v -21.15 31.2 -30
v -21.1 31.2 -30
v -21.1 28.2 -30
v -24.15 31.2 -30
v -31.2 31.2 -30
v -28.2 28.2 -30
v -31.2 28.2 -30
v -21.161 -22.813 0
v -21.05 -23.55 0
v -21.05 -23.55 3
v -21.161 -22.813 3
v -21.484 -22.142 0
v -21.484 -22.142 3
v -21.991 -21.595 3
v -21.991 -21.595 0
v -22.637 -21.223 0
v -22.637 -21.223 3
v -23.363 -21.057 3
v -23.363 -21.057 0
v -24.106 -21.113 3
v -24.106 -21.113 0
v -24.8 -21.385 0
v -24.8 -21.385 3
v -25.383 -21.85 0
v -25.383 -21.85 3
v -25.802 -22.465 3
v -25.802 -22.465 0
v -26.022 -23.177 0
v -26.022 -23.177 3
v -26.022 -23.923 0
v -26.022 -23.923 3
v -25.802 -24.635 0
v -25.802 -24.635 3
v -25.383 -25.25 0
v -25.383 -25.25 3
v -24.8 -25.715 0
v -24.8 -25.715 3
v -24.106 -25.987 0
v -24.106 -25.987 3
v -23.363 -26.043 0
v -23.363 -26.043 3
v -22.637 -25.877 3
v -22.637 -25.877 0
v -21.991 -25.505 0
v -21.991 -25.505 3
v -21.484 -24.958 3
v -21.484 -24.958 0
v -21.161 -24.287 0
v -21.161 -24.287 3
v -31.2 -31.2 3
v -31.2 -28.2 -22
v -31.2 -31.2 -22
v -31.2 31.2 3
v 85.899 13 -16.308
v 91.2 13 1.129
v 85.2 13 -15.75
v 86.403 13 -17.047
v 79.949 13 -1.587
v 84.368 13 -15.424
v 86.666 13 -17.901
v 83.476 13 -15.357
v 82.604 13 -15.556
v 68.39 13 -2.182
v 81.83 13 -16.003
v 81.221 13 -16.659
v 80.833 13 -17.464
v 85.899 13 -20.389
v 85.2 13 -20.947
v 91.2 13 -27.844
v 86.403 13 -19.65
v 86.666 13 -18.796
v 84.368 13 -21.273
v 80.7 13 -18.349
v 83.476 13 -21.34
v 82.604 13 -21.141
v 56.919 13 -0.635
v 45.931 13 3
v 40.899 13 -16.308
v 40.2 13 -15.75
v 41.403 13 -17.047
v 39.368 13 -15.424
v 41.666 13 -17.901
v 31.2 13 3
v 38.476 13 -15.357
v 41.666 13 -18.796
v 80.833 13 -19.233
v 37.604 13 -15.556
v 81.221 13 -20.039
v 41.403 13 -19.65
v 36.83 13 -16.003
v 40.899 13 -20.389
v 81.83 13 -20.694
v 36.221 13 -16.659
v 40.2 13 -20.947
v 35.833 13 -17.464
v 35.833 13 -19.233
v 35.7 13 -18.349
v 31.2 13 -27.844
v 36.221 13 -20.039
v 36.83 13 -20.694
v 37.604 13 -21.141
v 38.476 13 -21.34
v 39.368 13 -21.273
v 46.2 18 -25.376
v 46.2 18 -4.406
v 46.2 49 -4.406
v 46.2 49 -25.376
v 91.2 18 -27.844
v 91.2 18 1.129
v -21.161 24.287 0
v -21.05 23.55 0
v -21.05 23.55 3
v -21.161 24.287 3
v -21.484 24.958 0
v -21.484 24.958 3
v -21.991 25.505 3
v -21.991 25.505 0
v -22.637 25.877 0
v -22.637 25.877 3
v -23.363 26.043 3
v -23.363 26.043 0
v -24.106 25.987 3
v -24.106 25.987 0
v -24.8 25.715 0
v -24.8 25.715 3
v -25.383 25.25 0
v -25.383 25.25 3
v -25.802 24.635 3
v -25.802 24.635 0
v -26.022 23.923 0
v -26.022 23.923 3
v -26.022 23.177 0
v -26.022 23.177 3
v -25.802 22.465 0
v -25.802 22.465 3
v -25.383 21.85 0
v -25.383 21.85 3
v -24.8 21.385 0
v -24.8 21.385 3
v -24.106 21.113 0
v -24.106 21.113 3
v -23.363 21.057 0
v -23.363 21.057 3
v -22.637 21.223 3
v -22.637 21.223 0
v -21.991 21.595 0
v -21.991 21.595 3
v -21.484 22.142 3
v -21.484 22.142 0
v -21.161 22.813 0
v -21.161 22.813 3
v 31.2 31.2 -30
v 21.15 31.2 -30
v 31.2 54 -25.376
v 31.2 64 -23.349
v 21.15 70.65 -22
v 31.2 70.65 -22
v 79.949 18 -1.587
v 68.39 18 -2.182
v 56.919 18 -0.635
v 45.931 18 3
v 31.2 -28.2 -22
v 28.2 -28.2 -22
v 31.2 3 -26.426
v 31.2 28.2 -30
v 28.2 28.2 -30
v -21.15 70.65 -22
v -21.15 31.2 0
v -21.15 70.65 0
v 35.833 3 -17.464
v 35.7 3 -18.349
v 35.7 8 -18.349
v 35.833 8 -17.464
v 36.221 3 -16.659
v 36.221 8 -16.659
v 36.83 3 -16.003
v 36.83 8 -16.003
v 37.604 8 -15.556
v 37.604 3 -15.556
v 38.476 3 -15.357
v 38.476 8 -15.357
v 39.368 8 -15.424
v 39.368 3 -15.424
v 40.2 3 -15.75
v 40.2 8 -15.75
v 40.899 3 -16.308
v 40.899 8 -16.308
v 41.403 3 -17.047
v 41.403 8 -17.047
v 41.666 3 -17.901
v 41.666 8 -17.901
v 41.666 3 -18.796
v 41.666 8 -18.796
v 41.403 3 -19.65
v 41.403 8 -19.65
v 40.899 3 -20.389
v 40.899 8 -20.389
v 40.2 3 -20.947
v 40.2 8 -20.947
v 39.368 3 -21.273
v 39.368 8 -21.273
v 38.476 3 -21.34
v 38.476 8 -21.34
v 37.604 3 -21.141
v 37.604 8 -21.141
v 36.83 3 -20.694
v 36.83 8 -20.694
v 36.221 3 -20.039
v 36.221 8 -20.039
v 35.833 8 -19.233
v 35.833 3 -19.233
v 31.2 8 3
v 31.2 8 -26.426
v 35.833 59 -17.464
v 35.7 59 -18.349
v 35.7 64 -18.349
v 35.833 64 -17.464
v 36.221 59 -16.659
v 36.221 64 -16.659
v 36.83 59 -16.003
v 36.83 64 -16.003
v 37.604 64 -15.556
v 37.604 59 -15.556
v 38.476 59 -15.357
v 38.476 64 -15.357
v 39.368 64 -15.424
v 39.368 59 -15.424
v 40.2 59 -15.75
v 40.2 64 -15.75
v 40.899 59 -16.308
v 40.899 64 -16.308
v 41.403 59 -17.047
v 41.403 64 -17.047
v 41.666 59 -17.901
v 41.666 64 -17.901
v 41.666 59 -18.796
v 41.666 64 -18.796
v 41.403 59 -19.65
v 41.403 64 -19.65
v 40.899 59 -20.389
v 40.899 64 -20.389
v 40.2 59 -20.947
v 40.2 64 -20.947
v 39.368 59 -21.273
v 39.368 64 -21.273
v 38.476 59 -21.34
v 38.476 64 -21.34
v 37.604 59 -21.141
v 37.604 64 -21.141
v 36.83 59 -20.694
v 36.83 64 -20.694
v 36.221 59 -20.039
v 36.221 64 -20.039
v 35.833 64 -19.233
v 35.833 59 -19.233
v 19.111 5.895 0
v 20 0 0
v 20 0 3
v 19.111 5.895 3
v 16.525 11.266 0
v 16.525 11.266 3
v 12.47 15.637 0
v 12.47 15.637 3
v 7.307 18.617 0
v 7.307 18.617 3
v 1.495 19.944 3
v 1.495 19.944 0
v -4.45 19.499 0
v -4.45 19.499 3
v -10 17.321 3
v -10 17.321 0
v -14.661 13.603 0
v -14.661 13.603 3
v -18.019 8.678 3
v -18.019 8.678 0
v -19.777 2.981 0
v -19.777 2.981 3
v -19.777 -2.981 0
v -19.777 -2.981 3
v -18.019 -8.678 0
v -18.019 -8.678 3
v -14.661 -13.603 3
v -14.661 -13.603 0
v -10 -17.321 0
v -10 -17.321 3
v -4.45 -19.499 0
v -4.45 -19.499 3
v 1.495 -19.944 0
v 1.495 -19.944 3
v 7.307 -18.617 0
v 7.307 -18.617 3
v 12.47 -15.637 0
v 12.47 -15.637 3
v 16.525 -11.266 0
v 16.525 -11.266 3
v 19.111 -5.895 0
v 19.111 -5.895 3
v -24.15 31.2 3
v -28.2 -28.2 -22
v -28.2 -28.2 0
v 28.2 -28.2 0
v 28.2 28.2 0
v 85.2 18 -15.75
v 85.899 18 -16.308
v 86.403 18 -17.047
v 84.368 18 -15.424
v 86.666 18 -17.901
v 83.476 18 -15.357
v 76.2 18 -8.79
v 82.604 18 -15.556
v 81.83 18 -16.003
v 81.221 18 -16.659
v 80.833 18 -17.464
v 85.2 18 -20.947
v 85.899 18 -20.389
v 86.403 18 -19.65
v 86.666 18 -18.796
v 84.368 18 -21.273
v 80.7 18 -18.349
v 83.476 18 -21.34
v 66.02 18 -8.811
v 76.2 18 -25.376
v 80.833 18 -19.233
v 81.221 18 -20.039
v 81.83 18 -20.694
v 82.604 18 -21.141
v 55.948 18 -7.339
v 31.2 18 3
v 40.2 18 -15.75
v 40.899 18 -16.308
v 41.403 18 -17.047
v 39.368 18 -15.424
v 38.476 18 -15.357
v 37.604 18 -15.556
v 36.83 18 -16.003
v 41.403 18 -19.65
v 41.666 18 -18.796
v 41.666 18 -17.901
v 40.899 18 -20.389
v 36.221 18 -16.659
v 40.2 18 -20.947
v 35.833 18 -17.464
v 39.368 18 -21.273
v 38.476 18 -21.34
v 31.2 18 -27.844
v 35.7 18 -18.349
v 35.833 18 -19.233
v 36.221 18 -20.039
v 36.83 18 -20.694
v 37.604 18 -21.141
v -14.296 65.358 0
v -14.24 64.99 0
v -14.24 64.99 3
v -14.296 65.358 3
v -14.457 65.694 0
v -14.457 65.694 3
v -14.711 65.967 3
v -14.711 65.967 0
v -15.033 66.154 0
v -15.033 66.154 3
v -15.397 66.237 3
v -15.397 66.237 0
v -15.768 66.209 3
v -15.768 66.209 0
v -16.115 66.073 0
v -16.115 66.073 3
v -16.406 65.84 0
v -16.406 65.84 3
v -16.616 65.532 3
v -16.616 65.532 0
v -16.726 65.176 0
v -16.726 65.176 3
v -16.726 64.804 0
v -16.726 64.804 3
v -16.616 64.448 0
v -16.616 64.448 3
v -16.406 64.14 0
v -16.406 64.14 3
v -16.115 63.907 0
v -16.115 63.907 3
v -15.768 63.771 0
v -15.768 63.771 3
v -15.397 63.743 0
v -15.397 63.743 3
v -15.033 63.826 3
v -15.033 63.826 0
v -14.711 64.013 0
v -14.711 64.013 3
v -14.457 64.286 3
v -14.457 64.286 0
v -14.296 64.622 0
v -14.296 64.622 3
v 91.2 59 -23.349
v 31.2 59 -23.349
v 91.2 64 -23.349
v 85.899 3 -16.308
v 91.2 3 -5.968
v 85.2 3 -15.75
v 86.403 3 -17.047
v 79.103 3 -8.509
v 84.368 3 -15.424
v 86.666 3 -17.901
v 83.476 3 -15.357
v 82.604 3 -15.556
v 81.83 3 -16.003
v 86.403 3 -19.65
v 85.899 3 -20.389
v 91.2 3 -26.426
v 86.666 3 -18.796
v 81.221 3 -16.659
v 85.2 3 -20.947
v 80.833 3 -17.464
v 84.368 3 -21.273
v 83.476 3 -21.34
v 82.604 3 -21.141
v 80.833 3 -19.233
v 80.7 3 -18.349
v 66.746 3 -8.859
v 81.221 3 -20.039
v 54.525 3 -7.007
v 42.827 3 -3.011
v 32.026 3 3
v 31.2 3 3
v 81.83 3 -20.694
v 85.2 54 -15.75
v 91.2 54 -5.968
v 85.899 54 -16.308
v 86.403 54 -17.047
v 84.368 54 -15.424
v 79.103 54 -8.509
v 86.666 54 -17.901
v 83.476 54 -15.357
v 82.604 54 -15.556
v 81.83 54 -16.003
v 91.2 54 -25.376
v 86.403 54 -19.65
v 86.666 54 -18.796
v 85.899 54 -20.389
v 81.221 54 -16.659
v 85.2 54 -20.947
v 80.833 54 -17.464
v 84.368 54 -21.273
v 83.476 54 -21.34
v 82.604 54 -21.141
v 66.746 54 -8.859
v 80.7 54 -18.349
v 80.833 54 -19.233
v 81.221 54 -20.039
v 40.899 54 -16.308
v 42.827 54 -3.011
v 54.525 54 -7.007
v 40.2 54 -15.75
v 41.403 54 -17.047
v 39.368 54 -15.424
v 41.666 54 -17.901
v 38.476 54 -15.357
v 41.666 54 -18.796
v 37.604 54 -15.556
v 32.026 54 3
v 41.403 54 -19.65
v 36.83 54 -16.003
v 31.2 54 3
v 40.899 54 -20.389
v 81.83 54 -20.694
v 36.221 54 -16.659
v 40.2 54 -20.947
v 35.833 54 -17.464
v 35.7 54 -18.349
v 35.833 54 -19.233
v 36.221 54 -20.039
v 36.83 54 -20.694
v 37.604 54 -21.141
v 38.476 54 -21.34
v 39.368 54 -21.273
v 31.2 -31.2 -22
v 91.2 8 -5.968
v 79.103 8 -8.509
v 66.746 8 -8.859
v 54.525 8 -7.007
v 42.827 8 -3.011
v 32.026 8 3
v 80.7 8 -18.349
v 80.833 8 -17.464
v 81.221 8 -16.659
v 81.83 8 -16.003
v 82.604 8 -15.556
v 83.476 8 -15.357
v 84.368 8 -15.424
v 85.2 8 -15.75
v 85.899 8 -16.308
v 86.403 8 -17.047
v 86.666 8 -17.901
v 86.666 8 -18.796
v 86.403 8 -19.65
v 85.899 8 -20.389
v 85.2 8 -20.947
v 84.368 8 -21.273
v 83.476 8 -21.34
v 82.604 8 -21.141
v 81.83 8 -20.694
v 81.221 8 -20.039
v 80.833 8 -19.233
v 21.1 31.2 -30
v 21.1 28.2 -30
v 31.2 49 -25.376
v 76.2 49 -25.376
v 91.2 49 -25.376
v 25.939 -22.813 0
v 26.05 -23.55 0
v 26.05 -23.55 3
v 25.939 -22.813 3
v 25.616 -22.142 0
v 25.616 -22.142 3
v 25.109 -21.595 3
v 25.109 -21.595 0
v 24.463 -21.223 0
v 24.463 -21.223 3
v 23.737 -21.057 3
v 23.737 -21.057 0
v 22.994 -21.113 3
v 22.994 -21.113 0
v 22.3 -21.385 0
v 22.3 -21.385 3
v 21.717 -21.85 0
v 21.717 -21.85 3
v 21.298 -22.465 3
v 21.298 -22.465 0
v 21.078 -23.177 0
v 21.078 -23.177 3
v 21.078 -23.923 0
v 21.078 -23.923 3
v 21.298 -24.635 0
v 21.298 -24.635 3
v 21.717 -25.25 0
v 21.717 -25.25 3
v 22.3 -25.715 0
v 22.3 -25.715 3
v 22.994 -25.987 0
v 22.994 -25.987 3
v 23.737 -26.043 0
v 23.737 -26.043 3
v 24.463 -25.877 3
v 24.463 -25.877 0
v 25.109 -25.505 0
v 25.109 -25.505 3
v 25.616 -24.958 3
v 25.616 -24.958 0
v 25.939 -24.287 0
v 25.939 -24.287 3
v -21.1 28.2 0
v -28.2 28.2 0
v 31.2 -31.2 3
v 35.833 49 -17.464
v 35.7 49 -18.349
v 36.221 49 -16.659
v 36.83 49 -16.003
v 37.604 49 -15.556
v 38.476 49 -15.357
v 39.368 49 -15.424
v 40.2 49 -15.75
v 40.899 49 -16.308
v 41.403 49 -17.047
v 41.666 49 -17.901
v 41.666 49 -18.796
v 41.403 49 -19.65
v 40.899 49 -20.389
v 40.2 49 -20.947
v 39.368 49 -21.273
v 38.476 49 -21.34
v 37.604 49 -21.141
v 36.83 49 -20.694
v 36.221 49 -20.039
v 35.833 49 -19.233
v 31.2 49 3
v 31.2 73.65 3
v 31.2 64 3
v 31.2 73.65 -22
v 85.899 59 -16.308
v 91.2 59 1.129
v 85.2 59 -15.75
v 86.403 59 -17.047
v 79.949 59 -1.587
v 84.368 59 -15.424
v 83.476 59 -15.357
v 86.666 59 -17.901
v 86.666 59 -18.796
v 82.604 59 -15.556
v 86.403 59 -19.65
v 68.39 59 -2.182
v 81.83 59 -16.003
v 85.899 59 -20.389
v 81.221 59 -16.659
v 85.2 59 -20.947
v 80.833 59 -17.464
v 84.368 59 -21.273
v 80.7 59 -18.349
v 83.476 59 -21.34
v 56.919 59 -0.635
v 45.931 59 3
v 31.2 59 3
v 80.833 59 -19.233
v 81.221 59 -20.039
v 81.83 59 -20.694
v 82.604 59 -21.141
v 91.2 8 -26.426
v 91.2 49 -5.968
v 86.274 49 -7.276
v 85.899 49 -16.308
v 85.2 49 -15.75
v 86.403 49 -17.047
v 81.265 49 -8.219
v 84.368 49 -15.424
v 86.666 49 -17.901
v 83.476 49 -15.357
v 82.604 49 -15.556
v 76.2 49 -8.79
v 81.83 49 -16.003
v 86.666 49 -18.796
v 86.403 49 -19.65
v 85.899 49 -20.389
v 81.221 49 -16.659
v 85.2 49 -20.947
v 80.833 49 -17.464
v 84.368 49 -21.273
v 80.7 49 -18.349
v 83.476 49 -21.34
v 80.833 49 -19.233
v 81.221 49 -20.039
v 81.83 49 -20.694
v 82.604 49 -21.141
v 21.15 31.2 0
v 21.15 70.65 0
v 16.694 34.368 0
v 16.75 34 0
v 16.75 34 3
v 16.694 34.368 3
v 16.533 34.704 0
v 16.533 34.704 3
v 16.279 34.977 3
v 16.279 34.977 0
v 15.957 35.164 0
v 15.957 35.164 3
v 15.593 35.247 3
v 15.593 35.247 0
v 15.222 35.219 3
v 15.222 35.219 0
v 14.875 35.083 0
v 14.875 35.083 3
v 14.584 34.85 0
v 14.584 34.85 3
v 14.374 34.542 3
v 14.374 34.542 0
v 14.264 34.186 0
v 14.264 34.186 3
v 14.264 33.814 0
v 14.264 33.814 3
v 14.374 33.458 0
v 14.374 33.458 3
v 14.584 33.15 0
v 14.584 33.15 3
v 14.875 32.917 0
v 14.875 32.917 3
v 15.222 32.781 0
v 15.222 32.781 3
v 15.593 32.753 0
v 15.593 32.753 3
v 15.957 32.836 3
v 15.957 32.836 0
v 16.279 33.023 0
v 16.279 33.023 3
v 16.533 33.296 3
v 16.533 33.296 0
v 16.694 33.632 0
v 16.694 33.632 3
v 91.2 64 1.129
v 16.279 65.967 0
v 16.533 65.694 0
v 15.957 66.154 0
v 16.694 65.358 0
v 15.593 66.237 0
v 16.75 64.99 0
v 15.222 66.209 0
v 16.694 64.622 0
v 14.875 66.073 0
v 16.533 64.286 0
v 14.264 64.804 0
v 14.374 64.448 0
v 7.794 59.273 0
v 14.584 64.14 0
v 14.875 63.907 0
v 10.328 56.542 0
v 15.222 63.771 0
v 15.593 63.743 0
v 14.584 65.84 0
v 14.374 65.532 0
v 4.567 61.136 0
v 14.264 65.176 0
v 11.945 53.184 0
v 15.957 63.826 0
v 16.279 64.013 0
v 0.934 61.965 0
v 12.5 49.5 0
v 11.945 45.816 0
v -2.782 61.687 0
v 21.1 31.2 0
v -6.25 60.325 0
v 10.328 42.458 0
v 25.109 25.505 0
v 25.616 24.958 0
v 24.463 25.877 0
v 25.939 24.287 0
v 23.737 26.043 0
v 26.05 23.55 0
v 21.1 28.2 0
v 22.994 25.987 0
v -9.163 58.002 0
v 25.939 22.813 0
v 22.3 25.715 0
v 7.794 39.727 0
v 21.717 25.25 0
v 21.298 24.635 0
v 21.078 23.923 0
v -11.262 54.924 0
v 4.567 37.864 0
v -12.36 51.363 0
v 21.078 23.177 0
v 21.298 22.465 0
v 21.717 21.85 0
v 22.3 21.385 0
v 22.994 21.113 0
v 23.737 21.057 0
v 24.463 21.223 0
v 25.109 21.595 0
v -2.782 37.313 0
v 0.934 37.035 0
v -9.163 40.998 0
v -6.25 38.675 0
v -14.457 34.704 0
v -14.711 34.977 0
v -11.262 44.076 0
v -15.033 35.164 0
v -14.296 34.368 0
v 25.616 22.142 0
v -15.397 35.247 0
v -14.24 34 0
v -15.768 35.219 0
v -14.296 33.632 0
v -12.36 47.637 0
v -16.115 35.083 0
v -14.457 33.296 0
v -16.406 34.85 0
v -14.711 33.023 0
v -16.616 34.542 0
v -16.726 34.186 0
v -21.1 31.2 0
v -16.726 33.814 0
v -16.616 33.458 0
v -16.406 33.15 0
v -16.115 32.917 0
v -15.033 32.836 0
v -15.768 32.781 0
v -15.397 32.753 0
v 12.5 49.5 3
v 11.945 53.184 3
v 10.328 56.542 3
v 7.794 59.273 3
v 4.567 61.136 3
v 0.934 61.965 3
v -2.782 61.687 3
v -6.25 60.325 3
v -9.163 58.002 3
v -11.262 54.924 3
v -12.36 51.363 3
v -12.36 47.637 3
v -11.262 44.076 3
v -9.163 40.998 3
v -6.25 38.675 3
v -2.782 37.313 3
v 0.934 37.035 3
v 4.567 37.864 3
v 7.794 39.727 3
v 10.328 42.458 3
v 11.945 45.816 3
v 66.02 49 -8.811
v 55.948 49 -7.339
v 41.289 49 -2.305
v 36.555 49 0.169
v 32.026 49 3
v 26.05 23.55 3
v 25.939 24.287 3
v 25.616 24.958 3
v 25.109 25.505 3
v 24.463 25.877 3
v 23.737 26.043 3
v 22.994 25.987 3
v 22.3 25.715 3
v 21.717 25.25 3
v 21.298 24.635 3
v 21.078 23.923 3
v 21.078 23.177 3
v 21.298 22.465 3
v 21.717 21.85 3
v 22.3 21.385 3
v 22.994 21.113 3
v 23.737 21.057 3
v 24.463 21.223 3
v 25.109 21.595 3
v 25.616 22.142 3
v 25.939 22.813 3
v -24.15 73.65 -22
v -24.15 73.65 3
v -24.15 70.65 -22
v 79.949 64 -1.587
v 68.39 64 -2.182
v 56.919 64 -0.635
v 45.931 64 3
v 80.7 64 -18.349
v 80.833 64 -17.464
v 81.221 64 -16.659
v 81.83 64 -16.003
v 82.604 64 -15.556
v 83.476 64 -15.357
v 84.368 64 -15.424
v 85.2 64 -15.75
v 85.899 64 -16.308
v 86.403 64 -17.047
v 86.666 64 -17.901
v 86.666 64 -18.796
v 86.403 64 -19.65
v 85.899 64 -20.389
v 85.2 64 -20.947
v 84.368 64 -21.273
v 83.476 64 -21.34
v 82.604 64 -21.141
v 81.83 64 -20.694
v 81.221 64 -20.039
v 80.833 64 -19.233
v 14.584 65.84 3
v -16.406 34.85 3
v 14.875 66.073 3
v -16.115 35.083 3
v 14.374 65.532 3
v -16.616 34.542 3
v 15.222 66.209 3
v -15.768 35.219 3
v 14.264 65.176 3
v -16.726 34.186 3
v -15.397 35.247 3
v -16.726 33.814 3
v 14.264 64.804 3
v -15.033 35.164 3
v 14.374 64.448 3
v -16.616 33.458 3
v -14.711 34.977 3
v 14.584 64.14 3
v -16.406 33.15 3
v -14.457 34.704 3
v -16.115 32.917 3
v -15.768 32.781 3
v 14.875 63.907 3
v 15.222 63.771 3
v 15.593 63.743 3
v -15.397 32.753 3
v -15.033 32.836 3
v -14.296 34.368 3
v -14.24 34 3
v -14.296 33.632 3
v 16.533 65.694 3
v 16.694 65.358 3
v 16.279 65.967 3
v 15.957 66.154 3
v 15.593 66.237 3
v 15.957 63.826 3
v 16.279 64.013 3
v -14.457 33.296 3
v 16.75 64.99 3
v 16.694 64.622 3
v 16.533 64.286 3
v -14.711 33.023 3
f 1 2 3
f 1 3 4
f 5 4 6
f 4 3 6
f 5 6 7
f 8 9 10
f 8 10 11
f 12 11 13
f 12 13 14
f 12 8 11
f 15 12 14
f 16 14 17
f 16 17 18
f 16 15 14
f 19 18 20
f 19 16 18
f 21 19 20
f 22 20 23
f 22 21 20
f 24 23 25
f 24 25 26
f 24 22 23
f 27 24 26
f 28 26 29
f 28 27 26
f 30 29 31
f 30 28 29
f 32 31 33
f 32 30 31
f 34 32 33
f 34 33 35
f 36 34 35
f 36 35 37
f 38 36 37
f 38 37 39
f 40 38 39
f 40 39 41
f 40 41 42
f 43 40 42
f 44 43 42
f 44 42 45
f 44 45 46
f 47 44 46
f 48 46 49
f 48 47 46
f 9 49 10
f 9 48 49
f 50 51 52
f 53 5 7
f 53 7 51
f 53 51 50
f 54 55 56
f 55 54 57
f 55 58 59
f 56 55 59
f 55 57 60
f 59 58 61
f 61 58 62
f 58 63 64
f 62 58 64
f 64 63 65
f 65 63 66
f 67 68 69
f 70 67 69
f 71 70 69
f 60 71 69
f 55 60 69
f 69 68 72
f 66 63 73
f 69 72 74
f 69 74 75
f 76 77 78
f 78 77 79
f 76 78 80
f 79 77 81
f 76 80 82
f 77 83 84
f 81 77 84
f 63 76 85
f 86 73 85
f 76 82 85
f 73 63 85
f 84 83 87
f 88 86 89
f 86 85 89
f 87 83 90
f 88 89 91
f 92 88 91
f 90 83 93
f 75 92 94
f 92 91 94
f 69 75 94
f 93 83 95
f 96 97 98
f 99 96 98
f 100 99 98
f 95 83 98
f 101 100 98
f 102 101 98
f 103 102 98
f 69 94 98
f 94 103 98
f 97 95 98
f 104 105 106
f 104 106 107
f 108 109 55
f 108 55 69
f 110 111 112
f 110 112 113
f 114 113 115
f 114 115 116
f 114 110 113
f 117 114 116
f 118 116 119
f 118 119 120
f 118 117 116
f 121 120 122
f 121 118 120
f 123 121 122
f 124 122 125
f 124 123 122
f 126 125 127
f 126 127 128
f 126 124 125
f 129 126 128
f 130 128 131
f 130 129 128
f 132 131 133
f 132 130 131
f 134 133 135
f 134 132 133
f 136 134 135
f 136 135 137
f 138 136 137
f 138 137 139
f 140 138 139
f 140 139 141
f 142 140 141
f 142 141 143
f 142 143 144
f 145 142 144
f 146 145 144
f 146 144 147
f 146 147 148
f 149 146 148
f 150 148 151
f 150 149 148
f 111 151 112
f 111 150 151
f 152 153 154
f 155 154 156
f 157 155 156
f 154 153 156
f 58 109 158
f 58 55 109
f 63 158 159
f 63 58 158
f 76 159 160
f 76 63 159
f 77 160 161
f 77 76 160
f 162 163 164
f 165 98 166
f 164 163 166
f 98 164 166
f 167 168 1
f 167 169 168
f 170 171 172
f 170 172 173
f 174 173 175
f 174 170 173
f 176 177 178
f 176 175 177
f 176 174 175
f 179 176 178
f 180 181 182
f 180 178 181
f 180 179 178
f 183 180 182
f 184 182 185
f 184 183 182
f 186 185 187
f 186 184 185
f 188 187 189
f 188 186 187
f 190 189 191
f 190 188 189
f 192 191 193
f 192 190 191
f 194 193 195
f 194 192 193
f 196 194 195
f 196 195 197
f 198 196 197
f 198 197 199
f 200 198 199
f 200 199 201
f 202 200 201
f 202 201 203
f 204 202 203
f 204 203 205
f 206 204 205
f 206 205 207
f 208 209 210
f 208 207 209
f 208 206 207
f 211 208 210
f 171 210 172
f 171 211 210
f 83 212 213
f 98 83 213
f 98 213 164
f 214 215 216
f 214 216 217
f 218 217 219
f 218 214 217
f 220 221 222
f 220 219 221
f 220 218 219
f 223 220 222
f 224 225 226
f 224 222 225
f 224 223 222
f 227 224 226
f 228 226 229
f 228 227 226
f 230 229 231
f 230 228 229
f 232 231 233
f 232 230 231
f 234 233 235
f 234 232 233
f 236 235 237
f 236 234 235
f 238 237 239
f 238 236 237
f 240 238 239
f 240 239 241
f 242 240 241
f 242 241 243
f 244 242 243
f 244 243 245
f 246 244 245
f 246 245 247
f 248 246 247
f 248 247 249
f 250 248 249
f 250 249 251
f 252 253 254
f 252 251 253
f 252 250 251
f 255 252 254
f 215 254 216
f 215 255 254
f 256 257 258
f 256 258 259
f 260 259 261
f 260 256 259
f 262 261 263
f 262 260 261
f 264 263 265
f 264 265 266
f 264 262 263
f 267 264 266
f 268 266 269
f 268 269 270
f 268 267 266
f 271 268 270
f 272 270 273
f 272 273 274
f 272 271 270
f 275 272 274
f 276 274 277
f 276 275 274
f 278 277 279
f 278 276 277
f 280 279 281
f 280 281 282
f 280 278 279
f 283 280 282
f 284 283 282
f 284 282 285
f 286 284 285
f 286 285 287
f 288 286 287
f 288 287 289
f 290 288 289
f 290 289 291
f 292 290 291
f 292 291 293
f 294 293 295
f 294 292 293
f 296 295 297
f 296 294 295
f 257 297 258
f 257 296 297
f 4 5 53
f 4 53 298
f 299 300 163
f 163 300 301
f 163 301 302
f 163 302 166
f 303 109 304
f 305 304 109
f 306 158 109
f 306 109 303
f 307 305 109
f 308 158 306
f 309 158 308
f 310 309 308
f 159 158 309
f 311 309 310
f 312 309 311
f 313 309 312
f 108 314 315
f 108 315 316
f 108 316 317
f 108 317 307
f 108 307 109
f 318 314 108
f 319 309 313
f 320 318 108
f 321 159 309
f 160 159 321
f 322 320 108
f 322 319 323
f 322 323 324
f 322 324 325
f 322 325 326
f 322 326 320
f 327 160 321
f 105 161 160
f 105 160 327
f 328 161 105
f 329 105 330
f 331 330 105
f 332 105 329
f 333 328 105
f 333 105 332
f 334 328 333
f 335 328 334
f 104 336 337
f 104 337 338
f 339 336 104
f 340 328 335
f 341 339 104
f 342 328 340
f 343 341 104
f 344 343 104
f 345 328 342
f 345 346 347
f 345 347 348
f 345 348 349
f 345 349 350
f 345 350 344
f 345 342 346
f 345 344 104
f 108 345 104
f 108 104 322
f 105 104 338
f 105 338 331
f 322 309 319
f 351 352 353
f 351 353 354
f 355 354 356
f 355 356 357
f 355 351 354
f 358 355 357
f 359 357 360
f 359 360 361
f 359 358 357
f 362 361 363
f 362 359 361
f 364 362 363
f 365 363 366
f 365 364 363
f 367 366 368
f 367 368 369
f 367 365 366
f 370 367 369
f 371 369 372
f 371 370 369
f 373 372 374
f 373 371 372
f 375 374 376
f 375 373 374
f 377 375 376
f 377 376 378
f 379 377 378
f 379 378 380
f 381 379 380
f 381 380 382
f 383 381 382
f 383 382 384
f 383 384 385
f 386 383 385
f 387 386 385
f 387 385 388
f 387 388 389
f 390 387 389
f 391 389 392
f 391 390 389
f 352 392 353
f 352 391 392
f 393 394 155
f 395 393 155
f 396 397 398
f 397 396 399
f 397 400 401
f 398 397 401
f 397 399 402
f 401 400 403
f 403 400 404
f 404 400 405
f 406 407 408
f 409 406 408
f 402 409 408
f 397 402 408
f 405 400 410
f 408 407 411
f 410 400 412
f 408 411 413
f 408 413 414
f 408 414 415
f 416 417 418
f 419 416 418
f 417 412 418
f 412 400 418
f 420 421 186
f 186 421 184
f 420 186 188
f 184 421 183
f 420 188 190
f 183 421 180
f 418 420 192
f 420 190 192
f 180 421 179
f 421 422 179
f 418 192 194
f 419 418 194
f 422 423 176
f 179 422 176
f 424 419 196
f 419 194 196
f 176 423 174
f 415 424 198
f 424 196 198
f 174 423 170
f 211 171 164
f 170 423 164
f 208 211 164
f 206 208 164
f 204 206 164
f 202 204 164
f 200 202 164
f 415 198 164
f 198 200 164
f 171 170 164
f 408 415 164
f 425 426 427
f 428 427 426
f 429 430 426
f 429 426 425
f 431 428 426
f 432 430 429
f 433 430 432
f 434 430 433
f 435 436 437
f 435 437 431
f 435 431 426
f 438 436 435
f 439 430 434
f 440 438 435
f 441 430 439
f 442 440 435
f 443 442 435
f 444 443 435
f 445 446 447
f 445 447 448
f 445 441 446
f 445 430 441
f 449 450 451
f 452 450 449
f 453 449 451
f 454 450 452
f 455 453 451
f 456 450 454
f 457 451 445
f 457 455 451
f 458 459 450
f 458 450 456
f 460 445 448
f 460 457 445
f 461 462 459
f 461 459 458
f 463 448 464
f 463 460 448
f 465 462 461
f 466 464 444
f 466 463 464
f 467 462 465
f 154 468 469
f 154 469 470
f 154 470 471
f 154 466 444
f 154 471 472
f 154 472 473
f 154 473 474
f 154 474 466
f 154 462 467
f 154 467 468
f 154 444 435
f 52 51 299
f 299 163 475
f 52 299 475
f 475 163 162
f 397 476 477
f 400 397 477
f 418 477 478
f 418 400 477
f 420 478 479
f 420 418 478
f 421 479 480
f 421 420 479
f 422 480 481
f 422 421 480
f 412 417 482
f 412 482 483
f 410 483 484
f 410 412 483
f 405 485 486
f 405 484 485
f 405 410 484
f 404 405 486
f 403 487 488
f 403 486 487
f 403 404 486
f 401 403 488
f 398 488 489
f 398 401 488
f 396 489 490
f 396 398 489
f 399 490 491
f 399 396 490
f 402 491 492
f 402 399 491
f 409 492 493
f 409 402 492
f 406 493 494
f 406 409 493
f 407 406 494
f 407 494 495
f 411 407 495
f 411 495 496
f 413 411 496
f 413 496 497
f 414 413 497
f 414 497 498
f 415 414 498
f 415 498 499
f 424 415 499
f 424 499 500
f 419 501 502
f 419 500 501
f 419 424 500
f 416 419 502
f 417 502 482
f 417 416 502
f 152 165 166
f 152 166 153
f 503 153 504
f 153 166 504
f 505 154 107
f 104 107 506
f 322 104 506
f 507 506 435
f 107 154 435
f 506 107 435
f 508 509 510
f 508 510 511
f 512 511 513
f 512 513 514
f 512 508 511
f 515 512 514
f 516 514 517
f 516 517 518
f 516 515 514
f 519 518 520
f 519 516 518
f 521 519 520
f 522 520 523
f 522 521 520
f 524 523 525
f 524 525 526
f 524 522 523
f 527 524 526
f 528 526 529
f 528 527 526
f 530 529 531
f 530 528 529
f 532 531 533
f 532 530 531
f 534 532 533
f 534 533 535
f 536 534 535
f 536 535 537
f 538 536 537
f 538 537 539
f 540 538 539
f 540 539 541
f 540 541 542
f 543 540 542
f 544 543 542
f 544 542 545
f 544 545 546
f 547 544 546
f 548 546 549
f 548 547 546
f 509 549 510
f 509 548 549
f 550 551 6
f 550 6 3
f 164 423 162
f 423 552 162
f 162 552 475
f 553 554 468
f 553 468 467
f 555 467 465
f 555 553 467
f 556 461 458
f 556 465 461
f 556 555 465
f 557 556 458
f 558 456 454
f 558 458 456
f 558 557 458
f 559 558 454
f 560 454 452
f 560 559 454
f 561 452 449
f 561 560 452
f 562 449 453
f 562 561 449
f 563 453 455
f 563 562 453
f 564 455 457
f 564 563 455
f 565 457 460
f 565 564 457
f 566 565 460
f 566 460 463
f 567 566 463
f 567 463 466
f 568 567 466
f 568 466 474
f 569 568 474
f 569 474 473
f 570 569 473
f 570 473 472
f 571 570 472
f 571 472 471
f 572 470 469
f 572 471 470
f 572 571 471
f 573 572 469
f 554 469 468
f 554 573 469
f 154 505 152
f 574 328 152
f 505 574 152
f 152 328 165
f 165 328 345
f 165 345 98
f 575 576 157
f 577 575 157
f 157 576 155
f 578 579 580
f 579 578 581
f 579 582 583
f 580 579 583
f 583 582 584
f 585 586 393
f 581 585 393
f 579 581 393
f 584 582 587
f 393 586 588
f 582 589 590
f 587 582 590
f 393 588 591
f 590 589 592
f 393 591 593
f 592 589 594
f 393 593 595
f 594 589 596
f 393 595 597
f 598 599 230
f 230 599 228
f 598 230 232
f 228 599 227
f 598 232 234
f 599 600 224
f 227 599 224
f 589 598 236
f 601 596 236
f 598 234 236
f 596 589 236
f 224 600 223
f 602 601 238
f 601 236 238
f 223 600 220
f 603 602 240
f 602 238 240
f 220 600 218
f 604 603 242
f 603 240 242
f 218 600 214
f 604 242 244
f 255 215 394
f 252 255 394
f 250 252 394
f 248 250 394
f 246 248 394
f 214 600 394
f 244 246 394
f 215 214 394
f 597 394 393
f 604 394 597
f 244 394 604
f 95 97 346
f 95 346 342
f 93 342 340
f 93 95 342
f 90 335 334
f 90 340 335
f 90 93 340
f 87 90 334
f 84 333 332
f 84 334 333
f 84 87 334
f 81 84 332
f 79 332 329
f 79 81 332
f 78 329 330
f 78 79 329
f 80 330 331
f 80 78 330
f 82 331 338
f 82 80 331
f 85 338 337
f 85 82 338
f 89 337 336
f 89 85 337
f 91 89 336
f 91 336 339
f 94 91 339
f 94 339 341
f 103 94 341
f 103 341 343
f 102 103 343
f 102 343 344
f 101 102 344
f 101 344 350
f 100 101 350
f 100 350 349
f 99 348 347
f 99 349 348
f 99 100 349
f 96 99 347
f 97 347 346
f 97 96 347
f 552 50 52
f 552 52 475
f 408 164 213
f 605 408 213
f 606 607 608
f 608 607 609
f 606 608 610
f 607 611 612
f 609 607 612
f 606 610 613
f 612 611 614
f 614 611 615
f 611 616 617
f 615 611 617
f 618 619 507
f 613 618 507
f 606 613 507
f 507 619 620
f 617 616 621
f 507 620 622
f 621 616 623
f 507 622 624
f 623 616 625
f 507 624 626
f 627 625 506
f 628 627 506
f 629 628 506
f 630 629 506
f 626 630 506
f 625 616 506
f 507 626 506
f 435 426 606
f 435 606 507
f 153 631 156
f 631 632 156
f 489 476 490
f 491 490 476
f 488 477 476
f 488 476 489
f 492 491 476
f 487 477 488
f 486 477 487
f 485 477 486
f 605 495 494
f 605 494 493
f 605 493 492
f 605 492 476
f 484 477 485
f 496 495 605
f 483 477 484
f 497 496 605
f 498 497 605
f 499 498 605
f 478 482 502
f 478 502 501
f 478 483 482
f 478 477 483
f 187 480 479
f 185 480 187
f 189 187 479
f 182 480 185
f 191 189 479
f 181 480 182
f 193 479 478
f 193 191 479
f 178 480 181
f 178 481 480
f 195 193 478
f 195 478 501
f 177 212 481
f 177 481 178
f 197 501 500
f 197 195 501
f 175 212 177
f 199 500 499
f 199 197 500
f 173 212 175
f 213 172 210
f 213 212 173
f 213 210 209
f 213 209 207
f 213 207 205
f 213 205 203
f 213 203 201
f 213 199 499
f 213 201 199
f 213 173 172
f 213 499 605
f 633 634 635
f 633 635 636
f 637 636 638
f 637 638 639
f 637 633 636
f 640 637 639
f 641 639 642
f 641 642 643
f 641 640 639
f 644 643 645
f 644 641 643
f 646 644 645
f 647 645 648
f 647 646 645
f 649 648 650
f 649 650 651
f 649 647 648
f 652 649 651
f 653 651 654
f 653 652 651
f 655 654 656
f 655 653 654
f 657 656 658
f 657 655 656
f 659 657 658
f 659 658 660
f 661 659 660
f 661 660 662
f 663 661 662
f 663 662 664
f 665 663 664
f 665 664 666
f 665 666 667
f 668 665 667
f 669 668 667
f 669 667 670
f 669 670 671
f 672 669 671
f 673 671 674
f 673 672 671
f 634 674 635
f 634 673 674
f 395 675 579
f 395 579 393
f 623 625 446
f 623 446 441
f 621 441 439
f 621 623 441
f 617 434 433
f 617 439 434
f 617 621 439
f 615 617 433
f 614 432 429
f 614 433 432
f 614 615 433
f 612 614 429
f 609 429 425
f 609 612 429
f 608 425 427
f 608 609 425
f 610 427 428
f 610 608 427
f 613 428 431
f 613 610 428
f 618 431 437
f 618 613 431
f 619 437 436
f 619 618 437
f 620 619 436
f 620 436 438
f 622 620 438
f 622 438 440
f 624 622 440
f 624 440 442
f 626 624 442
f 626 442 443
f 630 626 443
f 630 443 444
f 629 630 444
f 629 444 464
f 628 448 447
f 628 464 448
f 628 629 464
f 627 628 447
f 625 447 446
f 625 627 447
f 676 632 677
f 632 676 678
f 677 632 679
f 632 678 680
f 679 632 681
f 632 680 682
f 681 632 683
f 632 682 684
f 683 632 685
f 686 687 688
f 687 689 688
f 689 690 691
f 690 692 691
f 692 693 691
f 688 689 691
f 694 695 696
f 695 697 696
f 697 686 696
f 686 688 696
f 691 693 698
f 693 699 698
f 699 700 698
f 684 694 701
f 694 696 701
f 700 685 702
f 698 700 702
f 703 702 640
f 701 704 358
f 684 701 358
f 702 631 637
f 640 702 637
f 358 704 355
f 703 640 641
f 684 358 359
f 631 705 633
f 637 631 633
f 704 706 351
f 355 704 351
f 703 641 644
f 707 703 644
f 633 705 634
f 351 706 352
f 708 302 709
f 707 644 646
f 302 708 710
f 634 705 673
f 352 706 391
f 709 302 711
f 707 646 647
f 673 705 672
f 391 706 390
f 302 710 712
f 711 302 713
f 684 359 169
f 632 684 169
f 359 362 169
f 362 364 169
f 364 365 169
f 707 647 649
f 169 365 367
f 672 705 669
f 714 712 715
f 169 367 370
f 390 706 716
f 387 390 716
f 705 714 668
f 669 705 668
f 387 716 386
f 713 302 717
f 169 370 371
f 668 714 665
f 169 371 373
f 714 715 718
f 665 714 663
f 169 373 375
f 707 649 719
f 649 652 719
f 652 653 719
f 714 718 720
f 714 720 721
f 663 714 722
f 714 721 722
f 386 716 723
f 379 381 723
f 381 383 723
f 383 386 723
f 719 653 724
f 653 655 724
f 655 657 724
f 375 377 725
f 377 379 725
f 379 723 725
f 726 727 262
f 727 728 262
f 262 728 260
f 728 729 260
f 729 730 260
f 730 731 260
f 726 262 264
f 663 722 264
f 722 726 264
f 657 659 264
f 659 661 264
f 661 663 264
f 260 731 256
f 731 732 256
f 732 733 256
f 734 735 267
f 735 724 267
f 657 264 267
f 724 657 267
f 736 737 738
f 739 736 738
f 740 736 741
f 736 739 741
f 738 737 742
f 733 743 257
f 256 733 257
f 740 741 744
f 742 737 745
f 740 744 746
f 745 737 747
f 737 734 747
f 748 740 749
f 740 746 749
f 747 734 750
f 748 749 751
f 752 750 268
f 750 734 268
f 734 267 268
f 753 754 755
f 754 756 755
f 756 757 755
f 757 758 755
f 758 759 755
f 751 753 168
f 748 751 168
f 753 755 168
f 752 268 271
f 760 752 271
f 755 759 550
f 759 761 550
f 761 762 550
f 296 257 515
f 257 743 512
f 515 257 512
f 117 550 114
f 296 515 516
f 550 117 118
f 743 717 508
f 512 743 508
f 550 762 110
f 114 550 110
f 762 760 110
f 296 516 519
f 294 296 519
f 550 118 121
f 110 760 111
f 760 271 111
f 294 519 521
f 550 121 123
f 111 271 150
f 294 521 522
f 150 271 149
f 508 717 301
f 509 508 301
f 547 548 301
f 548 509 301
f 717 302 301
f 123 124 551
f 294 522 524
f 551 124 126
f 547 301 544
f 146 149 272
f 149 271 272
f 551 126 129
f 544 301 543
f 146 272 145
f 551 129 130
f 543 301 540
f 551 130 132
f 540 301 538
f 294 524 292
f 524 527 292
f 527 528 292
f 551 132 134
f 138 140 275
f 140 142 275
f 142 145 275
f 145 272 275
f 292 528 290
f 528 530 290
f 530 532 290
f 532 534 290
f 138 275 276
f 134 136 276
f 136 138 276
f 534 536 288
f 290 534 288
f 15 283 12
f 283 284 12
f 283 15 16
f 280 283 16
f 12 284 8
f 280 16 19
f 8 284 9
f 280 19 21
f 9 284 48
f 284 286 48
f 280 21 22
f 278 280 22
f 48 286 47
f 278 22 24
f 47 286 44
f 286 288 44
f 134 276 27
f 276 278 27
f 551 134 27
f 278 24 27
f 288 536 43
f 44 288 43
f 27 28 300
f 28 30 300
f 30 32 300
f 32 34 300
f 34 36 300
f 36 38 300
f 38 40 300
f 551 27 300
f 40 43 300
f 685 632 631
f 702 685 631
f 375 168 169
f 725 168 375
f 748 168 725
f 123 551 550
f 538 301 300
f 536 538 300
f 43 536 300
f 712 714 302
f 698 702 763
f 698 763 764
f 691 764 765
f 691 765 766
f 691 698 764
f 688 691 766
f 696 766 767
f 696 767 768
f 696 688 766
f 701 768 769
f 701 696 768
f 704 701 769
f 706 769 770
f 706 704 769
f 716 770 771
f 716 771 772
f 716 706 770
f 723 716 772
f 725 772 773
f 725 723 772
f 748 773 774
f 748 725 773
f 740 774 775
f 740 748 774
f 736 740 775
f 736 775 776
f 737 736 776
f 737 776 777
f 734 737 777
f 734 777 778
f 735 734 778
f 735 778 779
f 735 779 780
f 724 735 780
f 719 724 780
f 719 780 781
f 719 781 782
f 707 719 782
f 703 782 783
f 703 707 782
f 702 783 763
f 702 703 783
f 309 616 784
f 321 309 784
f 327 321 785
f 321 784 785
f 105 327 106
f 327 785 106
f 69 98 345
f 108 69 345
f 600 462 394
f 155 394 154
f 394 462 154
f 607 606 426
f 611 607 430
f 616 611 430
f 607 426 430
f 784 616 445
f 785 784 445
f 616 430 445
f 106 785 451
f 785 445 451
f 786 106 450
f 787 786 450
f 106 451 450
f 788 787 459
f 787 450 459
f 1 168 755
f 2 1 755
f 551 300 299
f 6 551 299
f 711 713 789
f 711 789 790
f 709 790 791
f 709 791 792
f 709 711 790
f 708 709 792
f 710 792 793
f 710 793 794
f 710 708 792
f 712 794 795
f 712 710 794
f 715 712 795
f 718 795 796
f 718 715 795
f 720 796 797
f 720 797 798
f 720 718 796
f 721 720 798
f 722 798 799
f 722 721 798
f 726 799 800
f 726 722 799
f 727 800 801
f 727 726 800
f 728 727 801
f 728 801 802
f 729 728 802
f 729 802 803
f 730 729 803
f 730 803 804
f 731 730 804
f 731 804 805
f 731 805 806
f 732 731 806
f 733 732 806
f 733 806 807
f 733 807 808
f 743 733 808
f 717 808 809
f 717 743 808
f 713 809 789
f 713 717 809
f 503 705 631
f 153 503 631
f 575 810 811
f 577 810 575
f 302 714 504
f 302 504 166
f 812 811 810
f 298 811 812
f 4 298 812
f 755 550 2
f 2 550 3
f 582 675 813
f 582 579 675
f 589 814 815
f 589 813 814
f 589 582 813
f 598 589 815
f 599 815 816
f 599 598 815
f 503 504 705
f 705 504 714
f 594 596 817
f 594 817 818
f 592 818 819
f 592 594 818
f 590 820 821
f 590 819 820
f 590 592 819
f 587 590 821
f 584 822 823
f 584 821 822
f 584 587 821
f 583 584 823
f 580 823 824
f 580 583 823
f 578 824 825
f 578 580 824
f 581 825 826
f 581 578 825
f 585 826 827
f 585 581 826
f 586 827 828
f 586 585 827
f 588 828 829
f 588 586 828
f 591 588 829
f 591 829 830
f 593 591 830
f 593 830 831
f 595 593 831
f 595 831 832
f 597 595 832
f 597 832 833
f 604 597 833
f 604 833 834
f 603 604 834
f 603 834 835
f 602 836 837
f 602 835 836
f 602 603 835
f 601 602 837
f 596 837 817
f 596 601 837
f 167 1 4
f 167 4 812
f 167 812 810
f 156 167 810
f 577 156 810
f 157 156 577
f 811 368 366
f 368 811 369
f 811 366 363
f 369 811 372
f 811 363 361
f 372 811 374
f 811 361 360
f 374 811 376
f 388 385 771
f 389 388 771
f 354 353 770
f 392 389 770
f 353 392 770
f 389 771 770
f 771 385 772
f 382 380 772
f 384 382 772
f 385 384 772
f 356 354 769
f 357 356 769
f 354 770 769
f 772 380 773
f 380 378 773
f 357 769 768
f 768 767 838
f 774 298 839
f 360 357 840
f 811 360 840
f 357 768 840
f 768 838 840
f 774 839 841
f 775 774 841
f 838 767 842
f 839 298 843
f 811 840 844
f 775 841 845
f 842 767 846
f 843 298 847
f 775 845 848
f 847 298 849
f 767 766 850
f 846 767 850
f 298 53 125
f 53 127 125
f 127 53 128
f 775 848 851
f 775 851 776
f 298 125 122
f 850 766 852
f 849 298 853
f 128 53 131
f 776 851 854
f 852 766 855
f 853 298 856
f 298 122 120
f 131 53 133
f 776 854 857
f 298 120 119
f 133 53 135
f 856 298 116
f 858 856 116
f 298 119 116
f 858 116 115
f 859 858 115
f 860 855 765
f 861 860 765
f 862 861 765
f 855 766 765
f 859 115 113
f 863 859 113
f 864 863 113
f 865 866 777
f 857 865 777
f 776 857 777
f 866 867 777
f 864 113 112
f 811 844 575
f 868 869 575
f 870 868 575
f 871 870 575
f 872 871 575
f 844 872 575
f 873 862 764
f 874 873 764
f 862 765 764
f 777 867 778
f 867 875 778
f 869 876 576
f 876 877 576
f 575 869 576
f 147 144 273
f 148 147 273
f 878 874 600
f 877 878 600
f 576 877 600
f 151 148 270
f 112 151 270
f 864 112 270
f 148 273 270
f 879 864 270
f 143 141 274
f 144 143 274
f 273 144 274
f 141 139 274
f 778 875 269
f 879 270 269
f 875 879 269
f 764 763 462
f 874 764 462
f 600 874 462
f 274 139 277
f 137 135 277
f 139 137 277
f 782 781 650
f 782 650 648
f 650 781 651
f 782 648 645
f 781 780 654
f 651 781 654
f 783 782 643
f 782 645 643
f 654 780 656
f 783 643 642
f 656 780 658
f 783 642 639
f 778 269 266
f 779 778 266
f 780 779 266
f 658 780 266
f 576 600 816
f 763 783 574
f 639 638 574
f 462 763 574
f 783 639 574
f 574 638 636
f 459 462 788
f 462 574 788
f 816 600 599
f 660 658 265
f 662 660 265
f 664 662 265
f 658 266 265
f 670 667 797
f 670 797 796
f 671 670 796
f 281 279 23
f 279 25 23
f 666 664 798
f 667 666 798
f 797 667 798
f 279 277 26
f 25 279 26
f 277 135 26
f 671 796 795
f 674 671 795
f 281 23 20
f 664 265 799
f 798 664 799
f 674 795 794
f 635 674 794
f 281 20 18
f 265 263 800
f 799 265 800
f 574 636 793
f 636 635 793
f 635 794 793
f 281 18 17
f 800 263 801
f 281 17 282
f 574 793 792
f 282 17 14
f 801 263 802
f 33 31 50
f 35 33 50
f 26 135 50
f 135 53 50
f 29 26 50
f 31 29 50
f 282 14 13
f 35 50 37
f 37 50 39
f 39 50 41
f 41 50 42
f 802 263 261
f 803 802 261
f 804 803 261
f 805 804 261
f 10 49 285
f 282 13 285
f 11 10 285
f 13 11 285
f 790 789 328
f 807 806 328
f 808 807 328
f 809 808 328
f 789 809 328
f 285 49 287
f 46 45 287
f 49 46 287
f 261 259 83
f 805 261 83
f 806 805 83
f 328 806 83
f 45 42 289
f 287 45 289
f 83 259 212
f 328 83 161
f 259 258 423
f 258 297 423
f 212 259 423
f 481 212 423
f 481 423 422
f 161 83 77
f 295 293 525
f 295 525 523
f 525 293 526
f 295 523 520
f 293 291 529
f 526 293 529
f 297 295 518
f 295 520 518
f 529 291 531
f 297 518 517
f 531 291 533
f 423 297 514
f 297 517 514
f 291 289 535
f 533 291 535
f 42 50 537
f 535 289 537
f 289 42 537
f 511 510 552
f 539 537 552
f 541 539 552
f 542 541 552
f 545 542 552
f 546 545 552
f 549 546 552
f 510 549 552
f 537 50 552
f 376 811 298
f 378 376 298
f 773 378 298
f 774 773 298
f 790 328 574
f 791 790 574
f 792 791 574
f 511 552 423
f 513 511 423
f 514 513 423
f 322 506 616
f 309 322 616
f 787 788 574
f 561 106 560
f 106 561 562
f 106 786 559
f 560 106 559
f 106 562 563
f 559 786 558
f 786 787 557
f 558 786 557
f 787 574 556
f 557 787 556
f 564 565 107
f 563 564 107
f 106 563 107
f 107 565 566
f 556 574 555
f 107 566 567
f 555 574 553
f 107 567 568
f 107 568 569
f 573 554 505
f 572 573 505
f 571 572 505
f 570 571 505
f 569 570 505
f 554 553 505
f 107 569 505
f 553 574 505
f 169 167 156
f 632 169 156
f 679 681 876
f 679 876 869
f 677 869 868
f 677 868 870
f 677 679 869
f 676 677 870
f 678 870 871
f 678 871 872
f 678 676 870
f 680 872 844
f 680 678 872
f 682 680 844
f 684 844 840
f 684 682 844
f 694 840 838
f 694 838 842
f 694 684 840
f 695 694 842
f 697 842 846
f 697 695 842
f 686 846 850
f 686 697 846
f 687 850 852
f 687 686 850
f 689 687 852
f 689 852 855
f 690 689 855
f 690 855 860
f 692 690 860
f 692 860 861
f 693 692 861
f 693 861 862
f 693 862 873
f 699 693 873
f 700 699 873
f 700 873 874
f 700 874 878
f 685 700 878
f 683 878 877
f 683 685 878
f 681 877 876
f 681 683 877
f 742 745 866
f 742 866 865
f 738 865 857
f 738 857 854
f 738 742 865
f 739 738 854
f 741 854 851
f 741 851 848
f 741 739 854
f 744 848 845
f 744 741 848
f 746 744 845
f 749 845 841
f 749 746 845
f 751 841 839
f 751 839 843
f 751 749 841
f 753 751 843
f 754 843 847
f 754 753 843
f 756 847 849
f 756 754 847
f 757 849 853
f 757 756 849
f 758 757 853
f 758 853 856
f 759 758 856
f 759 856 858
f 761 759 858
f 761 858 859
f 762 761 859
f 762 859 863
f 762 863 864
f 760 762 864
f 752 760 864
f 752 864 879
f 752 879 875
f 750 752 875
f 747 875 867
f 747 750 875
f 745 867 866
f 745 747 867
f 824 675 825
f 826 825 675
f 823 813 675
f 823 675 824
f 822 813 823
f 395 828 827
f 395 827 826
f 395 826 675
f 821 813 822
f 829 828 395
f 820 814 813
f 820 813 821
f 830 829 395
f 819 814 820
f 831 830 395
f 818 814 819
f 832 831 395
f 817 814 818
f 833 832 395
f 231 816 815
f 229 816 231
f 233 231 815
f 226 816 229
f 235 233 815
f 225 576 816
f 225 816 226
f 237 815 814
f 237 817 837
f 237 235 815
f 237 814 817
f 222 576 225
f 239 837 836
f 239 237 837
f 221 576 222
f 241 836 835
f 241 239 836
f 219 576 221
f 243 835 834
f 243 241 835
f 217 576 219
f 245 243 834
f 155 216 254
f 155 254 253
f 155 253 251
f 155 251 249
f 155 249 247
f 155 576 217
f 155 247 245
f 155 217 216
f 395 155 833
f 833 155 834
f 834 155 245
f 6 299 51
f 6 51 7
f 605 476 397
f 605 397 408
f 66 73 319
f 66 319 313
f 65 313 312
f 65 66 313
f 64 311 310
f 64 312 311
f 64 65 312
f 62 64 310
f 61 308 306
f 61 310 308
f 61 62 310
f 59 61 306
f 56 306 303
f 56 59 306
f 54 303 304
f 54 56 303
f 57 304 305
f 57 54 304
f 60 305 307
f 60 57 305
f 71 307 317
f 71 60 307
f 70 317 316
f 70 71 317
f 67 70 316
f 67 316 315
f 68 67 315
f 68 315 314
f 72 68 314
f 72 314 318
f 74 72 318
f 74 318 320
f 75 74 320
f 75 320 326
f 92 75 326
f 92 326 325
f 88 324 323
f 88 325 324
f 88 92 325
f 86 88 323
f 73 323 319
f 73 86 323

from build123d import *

# Parameters (mm, degrees)
SKETCH1_W               = 56.4
SKETCH1_H               = 56.4
SKETCH1_R               = 2.5
SKETCH1_R_2             = 20
SKETCH1_W_2             = 42.3
SKETCH1_H_2             = 42.45
SKETCH1_R_3             = 1.25
SKETCH1_R_4             = 12.5
BOSS_EXTRUDE1_DEPTH     = 3
BOSS_EXTRUDE2_DEPTH     = 3
BOSS_EXTRUDE3_DEPTH     = 3
BOSS_EXTRUDE4_DEPTH     = 3
BOSS_EXTRUDE5_DEPTH     = 7.05
SKETCH6_W               = 62.4
SKETCH6_H               = 25
BOSS_EXTRUDE6_DEPTH     = 3
SKETCH7_W               = 55.35
SKETCH7_H               = 25
BOSS_EXTRUDE7_DEPTH     = 3
SKETCH8_W               = 26.348542459
SKETCH8_H               = 5
SKETCH8_W_2             = 28.376425856
SKETCH8_W_3             = 30.843971631
SKETCH8_W_4             = 29.425531915
BOSS_EXTRUDE8_DEPTH     = 60
SKETCH9_R               = 69.252729773
SKETCH9_R_2             = 19.252729773
CUT_EXTRUDE1_DEPTH      = 5
CUT_EXTRUDE2_START      = -51
SKETCH9_2_R             = 69.252729773
SKETCH9_2_R_2           = 19.252729773
CUT_EXTRUDE2_DEPTH      = 5
CUT_EXTRUDE3_DEPTH      = 136.205325339
CUT_EXTRUDE3_DEPTH_BACK = 136.205325339
SKETCH10_R              = 62.5
BOSS_EXTRUDE9_DEPTH     = 31
CUT_EXTRUDE4_DEPTH      = 129.360741662
CUT_EXTRUDE4_DEPTH_BACK = 129.360741662
SKETCH12_R              = 3


with BuildPart() as part:
    # Sketch1 → Boss-Extrude1 (new body)
    # profile 1 of 2: a face of its own
    with BuildSketch(Plane.XY):
        Rectangle(SKETCH1_W, SKETCH1_H)
        with Locations((-23.55, -23.55)):
            Circle(SKETCH1_R, mode=Mode.SUBTRACT)
        with Locations((-23.55, 23.55)):
            Circle(SKETCH1_R, mode=Mode.SUBTRACT)
        with Locations((23.55, 23.55)):
            Circle(SKETCH1_R, mode=Mode.SUBTRACT)
        with Locations((23.55, -23.55)):
            Circle(SKETCH1_R, mode=Mode.SUBTRACT)
        Circle(SKETCH1_R_2, mode=Mode.SUBTRACT)
    # profile 2 of 2: a face of its own
    with BuildSketch(Plane.XY):
        with Locations((0, 49.425)):
            Rectangle(SKETCH1_W_2, SKETCH1_H_2)
        with Locations((-15.49, 34)):
            Circle(SKETCH1_R_3, mode=Mode.SUBTRACT)
        with Locations((-15.49, 64.99)):
            Circle(SKETCH1_R_3, mode=Mode.SUBTRACT)
        with Locations((15.5, 64.99)):
            Circle(SKETCH1_R_3, mode=Mode.SUBTRACT)
        with Locations((15.5, 34)):
            Circle(SKETCH1_R_3, mode=Mode.SUBTRACT)
        with Locations((0, 49.5)):
            Circle(SKETCH1_R_4, mode=Mode.SUBTRACT)
    extrude(amount=BOSS_EXTRUDE1_DEPTH)

    # Sketch2 → Boss-Extrude2 (add)
    with BuildSketch(Plane.ZY.offset(28.2)):
        Polygon((-22, -28.2), (-30, 28.2), (0, 28.2), (3, 28.2), (3, -28.2), align=None)
    boss_extrude2 = extrude(amount=BOSS_EXTRUDE2_DEPTH)

    # Mirror1: Boss-Extrude2 across plane
    add(boss_extrude2.mirror(Plane(origin=(0, 0, 0), x_dir=(0, 0, 1), z_dir=(1, 0, 0))))

    # Sketch3 → Boss-Extrude3 (add)
    with BuildSketch(Plane(origin=(0, 28.2, 0), x_dir=(1, 0, 0), z_dir=(0, 1, 0))):
        Polygon((-21.1, 30), (-31.2, 30), (-31.2, -3), (31.2, -3), (31.2, 30), (21.1, 30), (21.1, 0), (-21.1, 0), align=None)
    extrude(amount=BOSS_EXTRUDE3_DEPTH)

    # Sketch4 → Boss-Extrude4 (add)
    with BuildSketch(Plane(origin=(21.15, 0, 0), x_dir=(0, 0, -1), z_dir=(1, 0, 0))):
        Polygon((30, 31.2), (22, 70.65), (-3, 70.65), (-3, 31.2), align=None)
    boss_extrude4 = extrude(amount=BOSS_EXTRUDE4_DEPTH)

    # Mirror2: Boss-Extrude4 across plane
    add(boss_extrude4.mirror(Plane(origin=(0, 0, 0), x_dir=(0, 0, 1), z_dir=(1, 0, 0))))

    # Sketch5 → Boss-Extrude5 (add)
    with BuildSketch(Plane(origin=(24.15, 0, 0), x_dir=(0, 0, -1), z_dir=(1, 0, 0))):
        Polygon((-3, 31.2), (30, 31.2), (22, 70.65), (-3, 70.65), align=None)
    extrude(amount=BOSS_EXTRUDE5_DEPTH)

    # Sketch6 → Boss-Extrude6 (add)
    with BuildSketch(Plane.XZ.offset(28.2)):
        with Locations((0, -9.5)):
            Rectangle(SKETCH6_W, SKETCH6_H)
    extrude(amount=BOSS_EXTRUDE6_DEPTH)

    # Sketch7 → Boss-Extrude7 (add)
    with BuildSketch(Plane(origin=(0, 70.65, 0), x_dir=(1, 0, 0), z_dir=(0, 1, 0))):
        with Locations((3.525, 9.5)):
            Rectangle(SKETCH7_W, SKETCH7_H)
    extrude(amount=BOSS_EXTRUDE7_DEPTH)

    # Sketch8 → Boss-Extrude8 (add)
    with BuildSketch(Plane(origin=(31.2, 0, 0), x_dir=(0, 0, -1), z_dir=(1, 0, 0))):
        with Locations((10.17427123, 61.5)):
            Rectangle(SKETCH8_W, SKETCH8_H)
        with Locations((11.188212928, 51.5)):
            Rectangle(SKETCH8_W_2, SKETCH8_H)
        with Locations((12.421985816, 15.5)):
            Rectangle(SKETCH8_W_3, SKETCH8_H)
        with Locations((11.712765958, 5.5)):
            Rectangle(SKETCH8_W_4, SKETCH8_H)
    extrude(amount=BOSS_EXTRUDE8_DEPTH)

    # Sketch9 → Cut-Extrude1 (cut)
    with BuildSketch(Plane(origin=(0, 54, 0), x_dir=(1, 0, 0), z_dir=(0, 1, 0))):
        with Locations((70.970898887, -60.264609649)):
            Circle(SKETCH9_R)
        with Locations((70.970898887, -60.264609649)):
            Circle(SKETCH9_R_2, mode=Mode.SUBTRACT)
    extrude(amount=-CUT_EXTRUDE1_DEPTH, mode=Mode.SUBTRACT)

    # Sketch9<2> → Cut-Extrude2 (cut)
    with BuildSketch(Plane(origin=(0, 54, 0), x_dir=(1, 0, 0), z_dir=(0, 1, 0)).offset(CUT_EXTRUDE2_START)):
        with Locations((70.970898887, -60.264609649)):
            Circle(SKETCH9_2_R)
        with Locations((70.970898887, -60.264609649)):
            Circle(SKETCH9_2_R_2, mode=Mode.SUBTRACT)
    extrude(amount=CUT_EXTRUDE2_DEPTH, mode=Mode.SUBTRACT)

    # Sketch10 → Cut-Extrude3 (cut, two sides: drawn at the far end of the back side and taken through both)
    with BuildSketch(Plane(origin=(0, 64, 0), x_dir=(1, 0, 0), z_dir=(0, 1, 0)).offset(-CUT_EXTRUDE3_DEPTH_BACK)):
        with Locations((70.970898887, -60.264609649)):
            Circle(SKETCH10_R)
    extrude(amount=CUT_EXTRUDE3_DEPTH + CUT_EXTRUDE3_DEPTH_BACK, mode=Mode.SUBTRACT)

    # Sketch11 → Boss-Extrude9 (add)
    with BuildSketch(Plane.XZ.offset(-49)):
        with BuildLine():
            Line((46.2, -25.376425856), (76.2, -25.376425856))
            Line((76.2, -25.376425856), (76.2, -8.790419729))
            ThreePointArc((76.2, -8.790419729), (60.957142835, -8.260314799), (46.2, -4.406428299))
            Line((46.2, -4.406428299), (46.2, -25.376425856))
        make_face()
    extrude(amount=BOSS_EXTRUDE9_DEPTH)

    # Sketch12 → Cut-Extrude4 (cut, two sides: drawn at the far end of the back side and taken through both)
    with BuildSketch(Plane(origin=(0, 54, 0), x_dir=(1, 0, 0), z_dir=(0, 1, 0)).offset(-CUT_EXTRUDE4_DEPTH_BACK)):
        with Locations(Location((83.7, 18.348542459, 0), (0, 0, 180))):
            Circle(SKETCH12_R)
        with Locations(Location((38.7, 18.348542459, 0), (0, 0, 180))):
            Circle(SKETCH12_R)
    extrude(amount=CUT_EXTRUDE4_DEPTH + CUT_EXTRUDE4_DEPTH_BACK, mode=Mode.SUBTRACT)


solid = part.part
